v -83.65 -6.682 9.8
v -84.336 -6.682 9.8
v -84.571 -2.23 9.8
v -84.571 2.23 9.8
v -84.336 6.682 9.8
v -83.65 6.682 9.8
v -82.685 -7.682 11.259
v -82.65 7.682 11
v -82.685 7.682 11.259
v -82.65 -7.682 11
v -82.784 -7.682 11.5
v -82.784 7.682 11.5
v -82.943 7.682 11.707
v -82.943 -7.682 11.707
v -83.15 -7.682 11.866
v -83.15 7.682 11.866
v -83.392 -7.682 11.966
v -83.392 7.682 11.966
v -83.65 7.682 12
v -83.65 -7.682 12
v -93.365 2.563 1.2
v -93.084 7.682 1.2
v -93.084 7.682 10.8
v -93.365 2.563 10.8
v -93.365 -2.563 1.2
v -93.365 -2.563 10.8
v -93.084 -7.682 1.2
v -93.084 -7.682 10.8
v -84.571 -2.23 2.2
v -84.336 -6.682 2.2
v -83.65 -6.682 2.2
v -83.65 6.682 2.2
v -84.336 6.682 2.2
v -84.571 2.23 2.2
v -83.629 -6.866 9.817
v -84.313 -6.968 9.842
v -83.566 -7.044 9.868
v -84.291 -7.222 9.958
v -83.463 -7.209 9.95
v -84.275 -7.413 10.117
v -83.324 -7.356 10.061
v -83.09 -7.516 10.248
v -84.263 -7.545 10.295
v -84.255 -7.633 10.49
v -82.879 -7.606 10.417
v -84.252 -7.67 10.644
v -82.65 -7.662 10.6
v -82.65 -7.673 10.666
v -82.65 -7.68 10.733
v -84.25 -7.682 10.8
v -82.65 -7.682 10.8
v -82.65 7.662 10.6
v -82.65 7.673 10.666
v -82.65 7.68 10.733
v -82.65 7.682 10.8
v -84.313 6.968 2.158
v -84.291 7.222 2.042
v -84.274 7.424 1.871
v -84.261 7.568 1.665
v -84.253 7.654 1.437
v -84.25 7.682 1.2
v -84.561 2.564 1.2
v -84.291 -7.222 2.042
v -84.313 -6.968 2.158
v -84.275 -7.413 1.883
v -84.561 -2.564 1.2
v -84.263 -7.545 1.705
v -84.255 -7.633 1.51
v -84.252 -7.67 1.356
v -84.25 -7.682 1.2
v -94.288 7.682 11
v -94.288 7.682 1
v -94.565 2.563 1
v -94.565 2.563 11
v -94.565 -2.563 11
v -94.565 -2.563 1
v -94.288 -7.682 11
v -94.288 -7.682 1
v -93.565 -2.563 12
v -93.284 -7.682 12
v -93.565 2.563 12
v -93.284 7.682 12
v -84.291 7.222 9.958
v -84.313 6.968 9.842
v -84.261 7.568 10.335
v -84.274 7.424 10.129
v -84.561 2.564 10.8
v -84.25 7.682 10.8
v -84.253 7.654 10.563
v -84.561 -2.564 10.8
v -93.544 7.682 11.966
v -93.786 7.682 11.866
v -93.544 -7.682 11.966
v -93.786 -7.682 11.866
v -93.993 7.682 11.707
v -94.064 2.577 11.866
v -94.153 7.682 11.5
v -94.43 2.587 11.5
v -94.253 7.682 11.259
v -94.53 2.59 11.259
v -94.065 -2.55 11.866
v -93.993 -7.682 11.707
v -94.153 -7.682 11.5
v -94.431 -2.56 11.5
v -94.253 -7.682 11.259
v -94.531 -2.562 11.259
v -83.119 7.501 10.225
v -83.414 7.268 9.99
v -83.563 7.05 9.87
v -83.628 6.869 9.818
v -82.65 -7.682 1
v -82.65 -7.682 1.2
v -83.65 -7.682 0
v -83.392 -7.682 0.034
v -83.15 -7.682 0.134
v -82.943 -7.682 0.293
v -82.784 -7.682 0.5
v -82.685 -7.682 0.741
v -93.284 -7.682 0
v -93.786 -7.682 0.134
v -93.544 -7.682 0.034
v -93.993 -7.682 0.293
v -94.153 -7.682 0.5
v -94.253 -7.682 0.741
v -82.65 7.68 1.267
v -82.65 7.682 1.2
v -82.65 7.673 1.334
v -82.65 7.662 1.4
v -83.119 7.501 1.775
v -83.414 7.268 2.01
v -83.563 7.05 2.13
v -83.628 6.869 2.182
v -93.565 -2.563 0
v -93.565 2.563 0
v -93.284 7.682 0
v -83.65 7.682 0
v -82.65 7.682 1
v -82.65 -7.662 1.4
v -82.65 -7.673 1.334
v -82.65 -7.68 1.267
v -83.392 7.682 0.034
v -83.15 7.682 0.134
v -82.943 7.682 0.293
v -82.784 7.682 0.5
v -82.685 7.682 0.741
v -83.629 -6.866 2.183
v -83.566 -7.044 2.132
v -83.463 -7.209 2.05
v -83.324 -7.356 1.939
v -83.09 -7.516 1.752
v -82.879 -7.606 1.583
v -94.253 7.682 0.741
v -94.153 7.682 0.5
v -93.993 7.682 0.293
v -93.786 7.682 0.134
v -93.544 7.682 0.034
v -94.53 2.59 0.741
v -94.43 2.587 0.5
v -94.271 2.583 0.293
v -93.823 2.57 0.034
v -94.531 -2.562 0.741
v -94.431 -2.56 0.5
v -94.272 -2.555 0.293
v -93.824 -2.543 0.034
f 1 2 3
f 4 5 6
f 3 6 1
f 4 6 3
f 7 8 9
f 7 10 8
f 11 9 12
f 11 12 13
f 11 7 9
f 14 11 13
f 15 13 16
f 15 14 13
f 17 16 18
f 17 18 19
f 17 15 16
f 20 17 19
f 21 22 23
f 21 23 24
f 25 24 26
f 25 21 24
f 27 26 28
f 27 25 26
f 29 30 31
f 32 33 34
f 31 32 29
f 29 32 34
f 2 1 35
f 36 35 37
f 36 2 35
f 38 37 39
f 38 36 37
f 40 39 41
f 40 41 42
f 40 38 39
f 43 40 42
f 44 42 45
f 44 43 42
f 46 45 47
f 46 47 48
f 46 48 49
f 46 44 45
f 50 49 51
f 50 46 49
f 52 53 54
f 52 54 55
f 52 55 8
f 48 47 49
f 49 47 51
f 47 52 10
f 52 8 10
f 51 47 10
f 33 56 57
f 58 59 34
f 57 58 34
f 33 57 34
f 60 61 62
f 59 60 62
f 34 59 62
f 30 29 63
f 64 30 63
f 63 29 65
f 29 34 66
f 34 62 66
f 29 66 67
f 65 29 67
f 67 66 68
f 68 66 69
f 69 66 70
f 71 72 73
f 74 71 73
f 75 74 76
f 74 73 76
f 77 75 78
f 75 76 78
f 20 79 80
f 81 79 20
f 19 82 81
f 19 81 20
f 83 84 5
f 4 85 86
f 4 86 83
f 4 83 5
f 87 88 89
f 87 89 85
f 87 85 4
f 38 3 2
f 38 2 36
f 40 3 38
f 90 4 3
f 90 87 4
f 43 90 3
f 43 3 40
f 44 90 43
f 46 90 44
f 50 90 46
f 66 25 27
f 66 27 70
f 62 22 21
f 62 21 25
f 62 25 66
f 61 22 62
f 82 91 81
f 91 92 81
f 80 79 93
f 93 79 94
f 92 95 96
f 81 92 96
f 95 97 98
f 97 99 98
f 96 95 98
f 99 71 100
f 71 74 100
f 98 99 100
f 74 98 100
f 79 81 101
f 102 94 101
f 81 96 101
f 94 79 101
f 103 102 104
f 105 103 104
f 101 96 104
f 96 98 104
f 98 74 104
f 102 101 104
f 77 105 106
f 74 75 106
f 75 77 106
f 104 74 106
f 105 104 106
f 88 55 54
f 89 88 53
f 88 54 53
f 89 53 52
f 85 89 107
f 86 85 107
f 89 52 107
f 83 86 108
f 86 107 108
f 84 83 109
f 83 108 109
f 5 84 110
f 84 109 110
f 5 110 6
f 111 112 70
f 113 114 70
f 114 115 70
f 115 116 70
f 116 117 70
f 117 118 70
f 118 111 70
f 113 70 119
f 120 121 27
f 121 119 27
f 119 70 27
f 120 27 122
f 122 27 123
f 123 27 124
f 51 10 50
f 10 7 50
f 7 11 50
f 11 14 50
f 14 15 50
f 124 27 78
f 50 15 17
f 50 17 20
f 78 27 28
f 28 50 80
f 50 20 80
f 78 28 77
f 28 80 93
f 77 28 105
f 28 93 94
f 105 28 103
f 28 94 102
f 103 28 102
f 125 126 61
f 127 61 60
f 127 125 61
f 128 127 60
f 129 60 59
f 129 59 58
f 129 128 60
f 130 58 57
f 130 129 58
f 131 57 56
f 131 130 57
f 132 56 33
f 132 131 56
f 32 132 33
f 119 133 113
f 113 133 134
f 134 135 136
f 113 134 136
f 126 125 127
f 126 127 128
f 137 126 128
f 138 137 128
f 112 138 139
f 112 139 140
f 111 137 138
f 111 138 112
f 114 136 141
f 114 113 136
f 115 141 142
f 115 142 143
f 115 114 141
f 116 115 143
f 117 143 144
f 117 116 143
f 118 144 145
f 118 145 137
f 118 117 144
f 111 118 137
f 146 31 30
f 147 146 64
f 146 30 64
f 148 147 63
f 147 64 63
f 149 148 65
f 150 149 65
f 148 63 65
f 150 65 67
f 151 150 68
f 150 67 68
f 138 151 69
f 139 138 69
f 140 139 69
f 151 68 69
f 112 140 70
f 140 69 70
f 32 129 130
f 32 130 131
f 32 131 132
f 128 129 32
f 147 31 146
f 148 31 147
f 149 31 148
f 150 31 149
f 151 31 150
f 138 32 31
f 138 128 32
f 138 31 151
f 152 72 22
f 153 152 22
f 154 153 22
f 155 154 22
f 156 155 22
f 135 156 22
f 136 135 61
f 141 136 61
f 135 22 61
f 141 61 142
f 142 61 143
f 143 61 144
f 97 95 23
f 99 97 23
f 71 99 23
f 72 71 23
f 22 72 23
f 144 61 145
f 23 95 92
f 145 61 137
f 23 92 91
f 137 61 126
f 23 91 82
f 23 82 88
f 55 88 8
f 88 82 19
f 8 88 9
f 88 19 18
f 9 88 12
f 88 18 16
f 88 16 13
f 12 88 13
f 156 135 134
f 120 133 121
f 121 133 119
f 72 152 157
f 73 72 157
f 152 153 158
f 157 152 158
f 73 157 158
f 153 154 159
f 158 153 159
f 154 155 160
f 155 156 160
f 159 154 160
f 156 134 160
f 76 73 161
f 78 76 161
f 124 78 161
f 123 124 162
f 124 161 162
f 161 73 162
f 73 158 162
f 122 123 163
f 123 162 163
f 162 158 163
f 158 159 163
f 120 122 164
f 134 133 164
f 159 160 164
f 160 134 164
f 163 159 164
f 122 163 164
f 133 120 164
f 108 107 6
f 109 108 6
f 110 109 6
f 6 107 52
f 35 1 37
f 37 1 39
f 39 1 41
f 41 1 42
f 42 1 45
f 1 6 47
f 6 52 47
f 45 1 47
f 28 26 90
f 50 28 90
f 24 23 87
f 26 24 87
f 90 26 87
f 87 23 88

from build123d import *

# Parameters (mm, degrees)
PAD003_DEPTH       = 1.2
PAD004_DEPTH       = 9.6
PAD005_DEPTH       = 1.2
PAD006_DEPTH       = 1
PAD007_DEPTH       = 1
CHAMFER001_1_SIZE2 = 0.8
CHAMFER001_1_SIZE  = 1
CHAMFER001_2_SIZE2 = 0.8
CHAMFER001_2_SIZE  = 1
FILLET001_R        = 1


with BuildPart() as part:
    # Sketch006 → Pad003 (new body)
    with BuildSketch(Plane.XY):
        with BuildLine():
            ThreePointArc((-94.2875364362, 7.682478298), (-94.6, 0), (-94.2875364362, -7.682478298))
            Line((-94.2875364362, -7.682478298), (-82.6504571335, -7.682478298))
            Line((-82.6504571335, 7.682478298), (-82.6504571335, -7.682478298))
            Line((-94.2875364362, 7.682478298), (-82.6504571335, 7.682478298))
        make_face()
    extrude(amount=PAD003_DEPTH)

    # Sketch007 → Pad004 (join)
    with BuildSketch(Plane.XY.offset(1.2)):
        with BuildLine():
            ThreePointArc((-94.2875364362, 7.682478298), (-94.6, 0), (-94.2875364362, -7.682478298))
            Line((-93.0835083525, -7.682478298), (-94.2875364362, -7.682478298))
            ThreePointArc((-93.0835083525, 7.682478298), (-93.4, 0), (-93.0835083525, -7.682478298))
            Line((-94.2875364362, 7.682478298), (-93.0835083525, 7.682478298))
        make_face()
    extrude(amount=PAD004_DEPTH)

    # Sketch008 → Pad005 (join)
    with BuildSketch(Plane.XY.offset(10.8)):
        with BuildLine():
            ThreePointArc((-94.2875364362, 7.682478298), (-94.6, 0), (-94.2875364362, -7.682478298))
            Line((-94.2875364362, -7.682478298), (-82.6504571335, -7.682478298))
            Line((-82.6504571335, 7.682478298), (-82.6504571335, -7.682478298))
            Line((-94.2875364362, 7.682478298), (-82.6504571335, 7.682478298))
        make_face()
    extrude(amount=PAD005_DEPTH)

    # Sketch009 → Pad006 (join)
    with BuildSketch(Plane.XY.offset(1.2)):
        with BuildLine():
            ThreePointArc((-84.2504571335, 7.682478298), (-84.6, 0), (-84.2504571335, -7.682478298))
            Line((-82.6504571335, -7.682478298), (-84.2504571335, -7.682478298))
            Line((-82.6504571335, 7.682478298), (-82.6504571335, -7.682478298))
            Line((-84.2504571335, 7.682478298), (-82.6504571335, 7.682478298))
        make_face()
    extrude(amount=PAD006_DEPTH)

    # Sketch010 → Pad007 (join)
    with BuildSketch(Plane.XY.offset(10.8)):
        with BuildLine():
            ThreePointArc((-84.2504571335, 7.682478298), (-84.6, 0), (-84.2504571335, -7.682478298))
            Line((-82.6504571335, -7.682478298), (-84.2504571335, -7.682478298))
            Line((-82.6504571335, 7.682478298), (-82.6504571335, -7.682478298))
            Line((-84.2504571335, 7.682478298), (-82.6504571335, 7.682478298))
        make_face()
    extrude(amount=-PAD007_DEPTH)

    # Chamfer001 1
    chamfer001_1_edges = [part.edges().sort_by_distance(p)[0] for p in [
        (-82.650457, 0, 2.2),
    ]]
    chamfer001_1_side = part.faces().sort_by_distance((-83.56998, 0, 2.2))[0]
    chamfer(chamfer001_1_edges, length=CHAMFER001_1_SIZE, length2=CHAMFER001_1_SIZE2, reference=chamfer001_1_side)

    # Chamfer001 2
    chamfer001_2_edges = [part.edges().sort_by_distance(p)[0] for p in [
        (-82.650457, 0, 9.8),
    ]]
    chamfer001_2_side = part.faces().sort_by_distance((-83.56998, 0, 9.8))[0]
    chamfer(chamfer001_2_edges, length=CHAMFER001_2_SIZE, length2=CHAMFER001_2_SIZE2, reference=chamfer001_2_side)

    # Fillet001
    fillet001_edges = [part.edges().sort_by_distance(p)[0] for p in [
        (-94.6, 0, 0),
        (-94.6, 0, 12),
        (-82.650457, 0, 0),
        (-82.650457, 0, 12),
        (-83.950457, -7.682478, 9.8),
        (-83.950457, -7.682478, 2.2),
        (-83.950457, 7.682478, 2.2),
        (-83.950457, 7.682478, 9.8),
    ]]
    fillet(fillet001_edges, radius=FILLET001_R)


solid = part.part
